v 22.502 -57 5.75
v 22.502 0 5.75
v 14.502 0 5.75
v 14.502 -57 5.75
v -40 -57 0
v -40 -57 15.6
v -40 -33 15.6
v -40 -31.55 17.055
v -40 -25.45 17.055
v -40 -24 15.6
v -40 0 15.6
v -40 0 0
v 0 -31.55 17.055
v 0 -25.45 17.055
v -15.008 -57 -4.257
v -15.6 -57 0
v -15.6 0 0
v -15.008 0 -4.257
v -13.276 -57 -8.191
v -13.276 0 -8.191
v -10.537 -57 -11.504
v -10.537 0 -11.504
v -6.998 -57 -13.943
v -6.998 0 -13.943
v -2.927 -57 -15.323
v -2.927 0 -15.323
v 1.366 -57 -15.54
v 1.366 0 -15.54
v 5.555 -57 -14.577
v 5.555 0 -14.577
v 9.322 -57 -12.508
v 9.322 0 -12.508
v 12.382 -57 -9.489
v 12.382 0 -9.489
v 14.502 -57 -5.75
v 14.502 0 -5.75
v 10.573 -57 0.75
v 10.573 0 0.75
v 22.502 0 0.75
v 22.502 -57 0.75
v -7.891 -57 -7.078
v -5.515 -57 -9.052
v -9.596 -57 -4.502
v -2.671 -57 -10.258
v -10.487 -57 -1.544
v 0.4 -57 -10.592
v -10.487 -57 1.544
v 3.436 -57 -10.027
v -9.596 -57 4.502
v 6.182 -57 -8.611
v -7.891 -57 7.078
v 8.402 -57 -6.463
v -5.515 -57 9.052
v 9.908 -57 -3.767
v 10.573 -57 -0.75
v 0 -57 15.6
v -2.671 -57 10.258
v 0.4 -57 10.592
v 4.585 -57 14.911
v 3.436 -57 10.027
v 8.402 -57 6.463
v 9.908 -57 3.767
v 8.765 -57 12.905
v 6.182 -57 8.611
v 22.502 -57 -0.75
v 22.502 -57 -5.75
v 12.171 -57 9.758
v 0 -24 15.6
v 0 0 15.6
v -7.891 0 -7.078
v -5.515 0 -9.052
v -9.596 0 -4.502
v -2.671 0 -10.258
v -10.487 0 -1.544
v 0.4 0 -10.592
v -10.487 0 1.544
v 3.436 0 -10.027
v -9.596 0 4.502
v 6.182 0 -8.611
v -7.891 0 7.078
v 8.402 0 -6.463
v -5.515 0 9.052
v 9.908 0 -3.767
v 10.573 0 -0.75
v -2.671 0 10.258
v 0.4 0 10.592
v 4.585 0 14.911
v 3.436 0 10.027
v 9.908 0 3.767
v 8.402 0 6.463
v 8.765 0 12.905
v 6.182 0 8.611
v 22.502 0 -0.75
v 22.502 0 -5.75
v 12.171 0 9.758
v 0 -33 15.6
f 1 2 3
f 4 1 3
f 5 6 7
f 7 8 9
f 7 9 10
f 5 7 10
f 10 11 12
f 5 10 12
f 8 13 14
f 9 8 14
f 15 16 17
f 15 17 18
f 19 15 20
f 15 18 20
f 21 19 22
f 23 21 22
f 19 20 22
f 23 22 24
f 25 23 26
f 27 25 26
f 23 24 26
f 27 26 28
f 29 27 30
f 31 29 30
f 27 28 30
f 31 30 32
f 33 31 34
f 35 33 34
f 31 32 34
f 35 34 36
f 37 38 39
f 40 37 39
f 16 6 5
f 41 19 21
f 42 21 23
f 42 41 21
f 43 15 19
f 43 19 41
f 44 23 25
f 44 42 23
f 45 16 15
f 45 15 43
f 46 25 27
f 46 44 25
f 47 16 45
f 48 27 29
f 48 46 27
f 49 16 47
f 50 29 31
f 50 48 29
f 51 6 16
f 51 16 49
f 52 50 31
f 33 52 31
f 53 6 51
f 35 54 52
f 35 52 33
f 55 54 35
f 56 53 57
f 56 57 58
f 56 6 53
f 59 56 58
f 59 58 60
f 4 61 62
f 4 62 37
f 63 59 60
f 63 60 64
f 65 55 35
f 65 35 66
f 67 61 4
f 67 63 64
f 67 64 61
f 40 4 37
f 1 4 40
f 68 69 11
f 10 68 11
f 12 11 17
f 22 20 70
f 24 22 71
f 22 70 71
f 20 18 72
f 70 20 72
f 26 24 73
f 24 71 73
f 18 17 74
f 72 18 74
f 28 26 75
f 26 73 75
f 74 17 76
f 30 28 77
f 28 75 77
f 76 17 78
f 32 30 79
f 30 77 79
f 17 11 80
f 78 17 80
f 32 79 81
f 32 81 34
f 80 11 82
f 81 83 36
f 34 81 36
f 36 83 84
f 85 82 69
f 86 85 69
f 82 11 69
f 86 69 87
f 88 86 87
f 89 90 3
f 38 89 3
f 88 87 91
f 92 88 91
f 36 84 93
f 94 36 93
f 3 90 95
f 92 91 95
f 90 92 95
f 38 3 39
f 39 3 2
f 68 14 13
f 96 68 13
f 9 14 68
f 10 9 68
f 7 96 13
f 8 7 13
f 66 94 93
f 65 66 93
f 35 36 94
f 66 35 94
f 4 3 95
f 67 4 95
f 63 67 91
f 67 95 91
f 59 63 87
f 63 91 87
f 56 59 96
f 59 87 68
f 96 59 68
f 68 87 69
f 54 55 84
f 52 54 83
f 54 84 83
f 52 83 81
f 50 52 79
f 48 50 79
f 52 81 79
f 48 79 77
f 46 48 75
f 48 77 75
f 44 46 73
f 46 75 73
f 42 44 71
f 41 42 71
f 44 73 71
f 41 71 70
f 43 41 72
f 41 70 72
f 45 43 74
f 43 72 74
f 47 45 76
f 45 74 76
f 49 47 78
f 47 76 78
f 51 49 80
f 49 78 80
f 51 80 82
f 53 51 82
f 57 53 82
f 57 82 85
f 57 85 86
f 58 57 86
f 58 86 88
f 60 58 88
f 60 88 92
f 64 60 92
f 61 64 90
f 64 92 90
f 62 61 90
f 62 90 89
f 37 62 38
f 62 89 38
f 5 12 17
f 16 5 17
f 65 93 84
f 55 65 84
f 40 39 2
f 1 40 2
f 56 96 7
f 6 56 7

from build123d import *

# Parameters (mm, degrees)
F1_DEPTH = 57
F3_DEPTH = 40


# Not quite as in the source:
# - a feature of the source that left no trace in its solid (it failed there, or was rolled back) is left out


with BuildPart() as f1:
    # F0 (on Front) → F1 (new body)
    with BuildSketch(Plane.XZ):
        with BuildLine():
            ThreePointArc((-15.6, 0), (-11.0308657865, 11.0308657865), (0, 15.6))
            Line((0, 15.6), (-40, 15.6))
            Line((-40, 15.6), (-40, 0))
            Line((-40, 0), (-15.6, 0))
        make_face()
        with BuildLine():
            ThreePointArc((10.5734336902, -0.75), (-10.6, 0), (10.5734336902, 0.75))
            Line((10.5734336902, 0.75), (15.5819607239, 0.75))
            ThreePointArc((15.5819607239, 0.75), (15.2481384312, 3.2945825812), (14.5016378385, 5.75))
            ThreePointArc((14.5016378385, 5.75), (8.765272386, 12.9046503246), (0, 15.6))
            ThreePointArc((0, 15.6), (-11.0308657865, 11.0308657865), (-15.6, 0))
            ThreePointArc((-15.6, 0), (-2.9269822103, -15.3229492964), (14.5016378385, -5.75))
            ThreePointArc((14.5016378385, -5.75), (15.2481384312, -3.2945825812), (15.5819607239, -0.75))
            Line((15.5819607239, -0.75), (10.5734336902, -0.75))
        make_face()
        with BuildLine():
            ThreePointArc((14.5016378385, 5.75), (15.2481384312, 3.2945825812), (15.5819607239, 0.75))
            Line((15.5819607239, 0.75), (22.5016378385, 0.75))
            Line((22.5016378385, 0.75), (22.5016378385, 5.75))
            Line((22.5016378385, 5.75), (14.5016378385, 5.75))
        make_face()
        with BuildLine():
            Line((22.5016378385, -0.75), (15.5819607239, -0.75))
            ThreePointArc((15.5819607239, -0.75), (15.2481384312, -3.2945825812), (14.5016378385, -5.75))
            Line((14.5016378385, -5.75), (22.5016378385, -5.75))
            Line((22.5016378385, -5.75), (22.5016378385, -0.75))
        make_face()
    extrude(amount=F1_DEPTH)

    # F2 (on face) → F3 (join)
    with BuildSketch(Plane(origin=(-40, 0, 0), x_dir=(0, -1, 0), z_dir=(-1, 0, 0))):
        Polygon((25.45, 17.055), (24, 15.6), (33, 15.6), (31.55, 17.055), align=None)
    extrude(amount=-F3_DEPTH)


solid = f1.part
